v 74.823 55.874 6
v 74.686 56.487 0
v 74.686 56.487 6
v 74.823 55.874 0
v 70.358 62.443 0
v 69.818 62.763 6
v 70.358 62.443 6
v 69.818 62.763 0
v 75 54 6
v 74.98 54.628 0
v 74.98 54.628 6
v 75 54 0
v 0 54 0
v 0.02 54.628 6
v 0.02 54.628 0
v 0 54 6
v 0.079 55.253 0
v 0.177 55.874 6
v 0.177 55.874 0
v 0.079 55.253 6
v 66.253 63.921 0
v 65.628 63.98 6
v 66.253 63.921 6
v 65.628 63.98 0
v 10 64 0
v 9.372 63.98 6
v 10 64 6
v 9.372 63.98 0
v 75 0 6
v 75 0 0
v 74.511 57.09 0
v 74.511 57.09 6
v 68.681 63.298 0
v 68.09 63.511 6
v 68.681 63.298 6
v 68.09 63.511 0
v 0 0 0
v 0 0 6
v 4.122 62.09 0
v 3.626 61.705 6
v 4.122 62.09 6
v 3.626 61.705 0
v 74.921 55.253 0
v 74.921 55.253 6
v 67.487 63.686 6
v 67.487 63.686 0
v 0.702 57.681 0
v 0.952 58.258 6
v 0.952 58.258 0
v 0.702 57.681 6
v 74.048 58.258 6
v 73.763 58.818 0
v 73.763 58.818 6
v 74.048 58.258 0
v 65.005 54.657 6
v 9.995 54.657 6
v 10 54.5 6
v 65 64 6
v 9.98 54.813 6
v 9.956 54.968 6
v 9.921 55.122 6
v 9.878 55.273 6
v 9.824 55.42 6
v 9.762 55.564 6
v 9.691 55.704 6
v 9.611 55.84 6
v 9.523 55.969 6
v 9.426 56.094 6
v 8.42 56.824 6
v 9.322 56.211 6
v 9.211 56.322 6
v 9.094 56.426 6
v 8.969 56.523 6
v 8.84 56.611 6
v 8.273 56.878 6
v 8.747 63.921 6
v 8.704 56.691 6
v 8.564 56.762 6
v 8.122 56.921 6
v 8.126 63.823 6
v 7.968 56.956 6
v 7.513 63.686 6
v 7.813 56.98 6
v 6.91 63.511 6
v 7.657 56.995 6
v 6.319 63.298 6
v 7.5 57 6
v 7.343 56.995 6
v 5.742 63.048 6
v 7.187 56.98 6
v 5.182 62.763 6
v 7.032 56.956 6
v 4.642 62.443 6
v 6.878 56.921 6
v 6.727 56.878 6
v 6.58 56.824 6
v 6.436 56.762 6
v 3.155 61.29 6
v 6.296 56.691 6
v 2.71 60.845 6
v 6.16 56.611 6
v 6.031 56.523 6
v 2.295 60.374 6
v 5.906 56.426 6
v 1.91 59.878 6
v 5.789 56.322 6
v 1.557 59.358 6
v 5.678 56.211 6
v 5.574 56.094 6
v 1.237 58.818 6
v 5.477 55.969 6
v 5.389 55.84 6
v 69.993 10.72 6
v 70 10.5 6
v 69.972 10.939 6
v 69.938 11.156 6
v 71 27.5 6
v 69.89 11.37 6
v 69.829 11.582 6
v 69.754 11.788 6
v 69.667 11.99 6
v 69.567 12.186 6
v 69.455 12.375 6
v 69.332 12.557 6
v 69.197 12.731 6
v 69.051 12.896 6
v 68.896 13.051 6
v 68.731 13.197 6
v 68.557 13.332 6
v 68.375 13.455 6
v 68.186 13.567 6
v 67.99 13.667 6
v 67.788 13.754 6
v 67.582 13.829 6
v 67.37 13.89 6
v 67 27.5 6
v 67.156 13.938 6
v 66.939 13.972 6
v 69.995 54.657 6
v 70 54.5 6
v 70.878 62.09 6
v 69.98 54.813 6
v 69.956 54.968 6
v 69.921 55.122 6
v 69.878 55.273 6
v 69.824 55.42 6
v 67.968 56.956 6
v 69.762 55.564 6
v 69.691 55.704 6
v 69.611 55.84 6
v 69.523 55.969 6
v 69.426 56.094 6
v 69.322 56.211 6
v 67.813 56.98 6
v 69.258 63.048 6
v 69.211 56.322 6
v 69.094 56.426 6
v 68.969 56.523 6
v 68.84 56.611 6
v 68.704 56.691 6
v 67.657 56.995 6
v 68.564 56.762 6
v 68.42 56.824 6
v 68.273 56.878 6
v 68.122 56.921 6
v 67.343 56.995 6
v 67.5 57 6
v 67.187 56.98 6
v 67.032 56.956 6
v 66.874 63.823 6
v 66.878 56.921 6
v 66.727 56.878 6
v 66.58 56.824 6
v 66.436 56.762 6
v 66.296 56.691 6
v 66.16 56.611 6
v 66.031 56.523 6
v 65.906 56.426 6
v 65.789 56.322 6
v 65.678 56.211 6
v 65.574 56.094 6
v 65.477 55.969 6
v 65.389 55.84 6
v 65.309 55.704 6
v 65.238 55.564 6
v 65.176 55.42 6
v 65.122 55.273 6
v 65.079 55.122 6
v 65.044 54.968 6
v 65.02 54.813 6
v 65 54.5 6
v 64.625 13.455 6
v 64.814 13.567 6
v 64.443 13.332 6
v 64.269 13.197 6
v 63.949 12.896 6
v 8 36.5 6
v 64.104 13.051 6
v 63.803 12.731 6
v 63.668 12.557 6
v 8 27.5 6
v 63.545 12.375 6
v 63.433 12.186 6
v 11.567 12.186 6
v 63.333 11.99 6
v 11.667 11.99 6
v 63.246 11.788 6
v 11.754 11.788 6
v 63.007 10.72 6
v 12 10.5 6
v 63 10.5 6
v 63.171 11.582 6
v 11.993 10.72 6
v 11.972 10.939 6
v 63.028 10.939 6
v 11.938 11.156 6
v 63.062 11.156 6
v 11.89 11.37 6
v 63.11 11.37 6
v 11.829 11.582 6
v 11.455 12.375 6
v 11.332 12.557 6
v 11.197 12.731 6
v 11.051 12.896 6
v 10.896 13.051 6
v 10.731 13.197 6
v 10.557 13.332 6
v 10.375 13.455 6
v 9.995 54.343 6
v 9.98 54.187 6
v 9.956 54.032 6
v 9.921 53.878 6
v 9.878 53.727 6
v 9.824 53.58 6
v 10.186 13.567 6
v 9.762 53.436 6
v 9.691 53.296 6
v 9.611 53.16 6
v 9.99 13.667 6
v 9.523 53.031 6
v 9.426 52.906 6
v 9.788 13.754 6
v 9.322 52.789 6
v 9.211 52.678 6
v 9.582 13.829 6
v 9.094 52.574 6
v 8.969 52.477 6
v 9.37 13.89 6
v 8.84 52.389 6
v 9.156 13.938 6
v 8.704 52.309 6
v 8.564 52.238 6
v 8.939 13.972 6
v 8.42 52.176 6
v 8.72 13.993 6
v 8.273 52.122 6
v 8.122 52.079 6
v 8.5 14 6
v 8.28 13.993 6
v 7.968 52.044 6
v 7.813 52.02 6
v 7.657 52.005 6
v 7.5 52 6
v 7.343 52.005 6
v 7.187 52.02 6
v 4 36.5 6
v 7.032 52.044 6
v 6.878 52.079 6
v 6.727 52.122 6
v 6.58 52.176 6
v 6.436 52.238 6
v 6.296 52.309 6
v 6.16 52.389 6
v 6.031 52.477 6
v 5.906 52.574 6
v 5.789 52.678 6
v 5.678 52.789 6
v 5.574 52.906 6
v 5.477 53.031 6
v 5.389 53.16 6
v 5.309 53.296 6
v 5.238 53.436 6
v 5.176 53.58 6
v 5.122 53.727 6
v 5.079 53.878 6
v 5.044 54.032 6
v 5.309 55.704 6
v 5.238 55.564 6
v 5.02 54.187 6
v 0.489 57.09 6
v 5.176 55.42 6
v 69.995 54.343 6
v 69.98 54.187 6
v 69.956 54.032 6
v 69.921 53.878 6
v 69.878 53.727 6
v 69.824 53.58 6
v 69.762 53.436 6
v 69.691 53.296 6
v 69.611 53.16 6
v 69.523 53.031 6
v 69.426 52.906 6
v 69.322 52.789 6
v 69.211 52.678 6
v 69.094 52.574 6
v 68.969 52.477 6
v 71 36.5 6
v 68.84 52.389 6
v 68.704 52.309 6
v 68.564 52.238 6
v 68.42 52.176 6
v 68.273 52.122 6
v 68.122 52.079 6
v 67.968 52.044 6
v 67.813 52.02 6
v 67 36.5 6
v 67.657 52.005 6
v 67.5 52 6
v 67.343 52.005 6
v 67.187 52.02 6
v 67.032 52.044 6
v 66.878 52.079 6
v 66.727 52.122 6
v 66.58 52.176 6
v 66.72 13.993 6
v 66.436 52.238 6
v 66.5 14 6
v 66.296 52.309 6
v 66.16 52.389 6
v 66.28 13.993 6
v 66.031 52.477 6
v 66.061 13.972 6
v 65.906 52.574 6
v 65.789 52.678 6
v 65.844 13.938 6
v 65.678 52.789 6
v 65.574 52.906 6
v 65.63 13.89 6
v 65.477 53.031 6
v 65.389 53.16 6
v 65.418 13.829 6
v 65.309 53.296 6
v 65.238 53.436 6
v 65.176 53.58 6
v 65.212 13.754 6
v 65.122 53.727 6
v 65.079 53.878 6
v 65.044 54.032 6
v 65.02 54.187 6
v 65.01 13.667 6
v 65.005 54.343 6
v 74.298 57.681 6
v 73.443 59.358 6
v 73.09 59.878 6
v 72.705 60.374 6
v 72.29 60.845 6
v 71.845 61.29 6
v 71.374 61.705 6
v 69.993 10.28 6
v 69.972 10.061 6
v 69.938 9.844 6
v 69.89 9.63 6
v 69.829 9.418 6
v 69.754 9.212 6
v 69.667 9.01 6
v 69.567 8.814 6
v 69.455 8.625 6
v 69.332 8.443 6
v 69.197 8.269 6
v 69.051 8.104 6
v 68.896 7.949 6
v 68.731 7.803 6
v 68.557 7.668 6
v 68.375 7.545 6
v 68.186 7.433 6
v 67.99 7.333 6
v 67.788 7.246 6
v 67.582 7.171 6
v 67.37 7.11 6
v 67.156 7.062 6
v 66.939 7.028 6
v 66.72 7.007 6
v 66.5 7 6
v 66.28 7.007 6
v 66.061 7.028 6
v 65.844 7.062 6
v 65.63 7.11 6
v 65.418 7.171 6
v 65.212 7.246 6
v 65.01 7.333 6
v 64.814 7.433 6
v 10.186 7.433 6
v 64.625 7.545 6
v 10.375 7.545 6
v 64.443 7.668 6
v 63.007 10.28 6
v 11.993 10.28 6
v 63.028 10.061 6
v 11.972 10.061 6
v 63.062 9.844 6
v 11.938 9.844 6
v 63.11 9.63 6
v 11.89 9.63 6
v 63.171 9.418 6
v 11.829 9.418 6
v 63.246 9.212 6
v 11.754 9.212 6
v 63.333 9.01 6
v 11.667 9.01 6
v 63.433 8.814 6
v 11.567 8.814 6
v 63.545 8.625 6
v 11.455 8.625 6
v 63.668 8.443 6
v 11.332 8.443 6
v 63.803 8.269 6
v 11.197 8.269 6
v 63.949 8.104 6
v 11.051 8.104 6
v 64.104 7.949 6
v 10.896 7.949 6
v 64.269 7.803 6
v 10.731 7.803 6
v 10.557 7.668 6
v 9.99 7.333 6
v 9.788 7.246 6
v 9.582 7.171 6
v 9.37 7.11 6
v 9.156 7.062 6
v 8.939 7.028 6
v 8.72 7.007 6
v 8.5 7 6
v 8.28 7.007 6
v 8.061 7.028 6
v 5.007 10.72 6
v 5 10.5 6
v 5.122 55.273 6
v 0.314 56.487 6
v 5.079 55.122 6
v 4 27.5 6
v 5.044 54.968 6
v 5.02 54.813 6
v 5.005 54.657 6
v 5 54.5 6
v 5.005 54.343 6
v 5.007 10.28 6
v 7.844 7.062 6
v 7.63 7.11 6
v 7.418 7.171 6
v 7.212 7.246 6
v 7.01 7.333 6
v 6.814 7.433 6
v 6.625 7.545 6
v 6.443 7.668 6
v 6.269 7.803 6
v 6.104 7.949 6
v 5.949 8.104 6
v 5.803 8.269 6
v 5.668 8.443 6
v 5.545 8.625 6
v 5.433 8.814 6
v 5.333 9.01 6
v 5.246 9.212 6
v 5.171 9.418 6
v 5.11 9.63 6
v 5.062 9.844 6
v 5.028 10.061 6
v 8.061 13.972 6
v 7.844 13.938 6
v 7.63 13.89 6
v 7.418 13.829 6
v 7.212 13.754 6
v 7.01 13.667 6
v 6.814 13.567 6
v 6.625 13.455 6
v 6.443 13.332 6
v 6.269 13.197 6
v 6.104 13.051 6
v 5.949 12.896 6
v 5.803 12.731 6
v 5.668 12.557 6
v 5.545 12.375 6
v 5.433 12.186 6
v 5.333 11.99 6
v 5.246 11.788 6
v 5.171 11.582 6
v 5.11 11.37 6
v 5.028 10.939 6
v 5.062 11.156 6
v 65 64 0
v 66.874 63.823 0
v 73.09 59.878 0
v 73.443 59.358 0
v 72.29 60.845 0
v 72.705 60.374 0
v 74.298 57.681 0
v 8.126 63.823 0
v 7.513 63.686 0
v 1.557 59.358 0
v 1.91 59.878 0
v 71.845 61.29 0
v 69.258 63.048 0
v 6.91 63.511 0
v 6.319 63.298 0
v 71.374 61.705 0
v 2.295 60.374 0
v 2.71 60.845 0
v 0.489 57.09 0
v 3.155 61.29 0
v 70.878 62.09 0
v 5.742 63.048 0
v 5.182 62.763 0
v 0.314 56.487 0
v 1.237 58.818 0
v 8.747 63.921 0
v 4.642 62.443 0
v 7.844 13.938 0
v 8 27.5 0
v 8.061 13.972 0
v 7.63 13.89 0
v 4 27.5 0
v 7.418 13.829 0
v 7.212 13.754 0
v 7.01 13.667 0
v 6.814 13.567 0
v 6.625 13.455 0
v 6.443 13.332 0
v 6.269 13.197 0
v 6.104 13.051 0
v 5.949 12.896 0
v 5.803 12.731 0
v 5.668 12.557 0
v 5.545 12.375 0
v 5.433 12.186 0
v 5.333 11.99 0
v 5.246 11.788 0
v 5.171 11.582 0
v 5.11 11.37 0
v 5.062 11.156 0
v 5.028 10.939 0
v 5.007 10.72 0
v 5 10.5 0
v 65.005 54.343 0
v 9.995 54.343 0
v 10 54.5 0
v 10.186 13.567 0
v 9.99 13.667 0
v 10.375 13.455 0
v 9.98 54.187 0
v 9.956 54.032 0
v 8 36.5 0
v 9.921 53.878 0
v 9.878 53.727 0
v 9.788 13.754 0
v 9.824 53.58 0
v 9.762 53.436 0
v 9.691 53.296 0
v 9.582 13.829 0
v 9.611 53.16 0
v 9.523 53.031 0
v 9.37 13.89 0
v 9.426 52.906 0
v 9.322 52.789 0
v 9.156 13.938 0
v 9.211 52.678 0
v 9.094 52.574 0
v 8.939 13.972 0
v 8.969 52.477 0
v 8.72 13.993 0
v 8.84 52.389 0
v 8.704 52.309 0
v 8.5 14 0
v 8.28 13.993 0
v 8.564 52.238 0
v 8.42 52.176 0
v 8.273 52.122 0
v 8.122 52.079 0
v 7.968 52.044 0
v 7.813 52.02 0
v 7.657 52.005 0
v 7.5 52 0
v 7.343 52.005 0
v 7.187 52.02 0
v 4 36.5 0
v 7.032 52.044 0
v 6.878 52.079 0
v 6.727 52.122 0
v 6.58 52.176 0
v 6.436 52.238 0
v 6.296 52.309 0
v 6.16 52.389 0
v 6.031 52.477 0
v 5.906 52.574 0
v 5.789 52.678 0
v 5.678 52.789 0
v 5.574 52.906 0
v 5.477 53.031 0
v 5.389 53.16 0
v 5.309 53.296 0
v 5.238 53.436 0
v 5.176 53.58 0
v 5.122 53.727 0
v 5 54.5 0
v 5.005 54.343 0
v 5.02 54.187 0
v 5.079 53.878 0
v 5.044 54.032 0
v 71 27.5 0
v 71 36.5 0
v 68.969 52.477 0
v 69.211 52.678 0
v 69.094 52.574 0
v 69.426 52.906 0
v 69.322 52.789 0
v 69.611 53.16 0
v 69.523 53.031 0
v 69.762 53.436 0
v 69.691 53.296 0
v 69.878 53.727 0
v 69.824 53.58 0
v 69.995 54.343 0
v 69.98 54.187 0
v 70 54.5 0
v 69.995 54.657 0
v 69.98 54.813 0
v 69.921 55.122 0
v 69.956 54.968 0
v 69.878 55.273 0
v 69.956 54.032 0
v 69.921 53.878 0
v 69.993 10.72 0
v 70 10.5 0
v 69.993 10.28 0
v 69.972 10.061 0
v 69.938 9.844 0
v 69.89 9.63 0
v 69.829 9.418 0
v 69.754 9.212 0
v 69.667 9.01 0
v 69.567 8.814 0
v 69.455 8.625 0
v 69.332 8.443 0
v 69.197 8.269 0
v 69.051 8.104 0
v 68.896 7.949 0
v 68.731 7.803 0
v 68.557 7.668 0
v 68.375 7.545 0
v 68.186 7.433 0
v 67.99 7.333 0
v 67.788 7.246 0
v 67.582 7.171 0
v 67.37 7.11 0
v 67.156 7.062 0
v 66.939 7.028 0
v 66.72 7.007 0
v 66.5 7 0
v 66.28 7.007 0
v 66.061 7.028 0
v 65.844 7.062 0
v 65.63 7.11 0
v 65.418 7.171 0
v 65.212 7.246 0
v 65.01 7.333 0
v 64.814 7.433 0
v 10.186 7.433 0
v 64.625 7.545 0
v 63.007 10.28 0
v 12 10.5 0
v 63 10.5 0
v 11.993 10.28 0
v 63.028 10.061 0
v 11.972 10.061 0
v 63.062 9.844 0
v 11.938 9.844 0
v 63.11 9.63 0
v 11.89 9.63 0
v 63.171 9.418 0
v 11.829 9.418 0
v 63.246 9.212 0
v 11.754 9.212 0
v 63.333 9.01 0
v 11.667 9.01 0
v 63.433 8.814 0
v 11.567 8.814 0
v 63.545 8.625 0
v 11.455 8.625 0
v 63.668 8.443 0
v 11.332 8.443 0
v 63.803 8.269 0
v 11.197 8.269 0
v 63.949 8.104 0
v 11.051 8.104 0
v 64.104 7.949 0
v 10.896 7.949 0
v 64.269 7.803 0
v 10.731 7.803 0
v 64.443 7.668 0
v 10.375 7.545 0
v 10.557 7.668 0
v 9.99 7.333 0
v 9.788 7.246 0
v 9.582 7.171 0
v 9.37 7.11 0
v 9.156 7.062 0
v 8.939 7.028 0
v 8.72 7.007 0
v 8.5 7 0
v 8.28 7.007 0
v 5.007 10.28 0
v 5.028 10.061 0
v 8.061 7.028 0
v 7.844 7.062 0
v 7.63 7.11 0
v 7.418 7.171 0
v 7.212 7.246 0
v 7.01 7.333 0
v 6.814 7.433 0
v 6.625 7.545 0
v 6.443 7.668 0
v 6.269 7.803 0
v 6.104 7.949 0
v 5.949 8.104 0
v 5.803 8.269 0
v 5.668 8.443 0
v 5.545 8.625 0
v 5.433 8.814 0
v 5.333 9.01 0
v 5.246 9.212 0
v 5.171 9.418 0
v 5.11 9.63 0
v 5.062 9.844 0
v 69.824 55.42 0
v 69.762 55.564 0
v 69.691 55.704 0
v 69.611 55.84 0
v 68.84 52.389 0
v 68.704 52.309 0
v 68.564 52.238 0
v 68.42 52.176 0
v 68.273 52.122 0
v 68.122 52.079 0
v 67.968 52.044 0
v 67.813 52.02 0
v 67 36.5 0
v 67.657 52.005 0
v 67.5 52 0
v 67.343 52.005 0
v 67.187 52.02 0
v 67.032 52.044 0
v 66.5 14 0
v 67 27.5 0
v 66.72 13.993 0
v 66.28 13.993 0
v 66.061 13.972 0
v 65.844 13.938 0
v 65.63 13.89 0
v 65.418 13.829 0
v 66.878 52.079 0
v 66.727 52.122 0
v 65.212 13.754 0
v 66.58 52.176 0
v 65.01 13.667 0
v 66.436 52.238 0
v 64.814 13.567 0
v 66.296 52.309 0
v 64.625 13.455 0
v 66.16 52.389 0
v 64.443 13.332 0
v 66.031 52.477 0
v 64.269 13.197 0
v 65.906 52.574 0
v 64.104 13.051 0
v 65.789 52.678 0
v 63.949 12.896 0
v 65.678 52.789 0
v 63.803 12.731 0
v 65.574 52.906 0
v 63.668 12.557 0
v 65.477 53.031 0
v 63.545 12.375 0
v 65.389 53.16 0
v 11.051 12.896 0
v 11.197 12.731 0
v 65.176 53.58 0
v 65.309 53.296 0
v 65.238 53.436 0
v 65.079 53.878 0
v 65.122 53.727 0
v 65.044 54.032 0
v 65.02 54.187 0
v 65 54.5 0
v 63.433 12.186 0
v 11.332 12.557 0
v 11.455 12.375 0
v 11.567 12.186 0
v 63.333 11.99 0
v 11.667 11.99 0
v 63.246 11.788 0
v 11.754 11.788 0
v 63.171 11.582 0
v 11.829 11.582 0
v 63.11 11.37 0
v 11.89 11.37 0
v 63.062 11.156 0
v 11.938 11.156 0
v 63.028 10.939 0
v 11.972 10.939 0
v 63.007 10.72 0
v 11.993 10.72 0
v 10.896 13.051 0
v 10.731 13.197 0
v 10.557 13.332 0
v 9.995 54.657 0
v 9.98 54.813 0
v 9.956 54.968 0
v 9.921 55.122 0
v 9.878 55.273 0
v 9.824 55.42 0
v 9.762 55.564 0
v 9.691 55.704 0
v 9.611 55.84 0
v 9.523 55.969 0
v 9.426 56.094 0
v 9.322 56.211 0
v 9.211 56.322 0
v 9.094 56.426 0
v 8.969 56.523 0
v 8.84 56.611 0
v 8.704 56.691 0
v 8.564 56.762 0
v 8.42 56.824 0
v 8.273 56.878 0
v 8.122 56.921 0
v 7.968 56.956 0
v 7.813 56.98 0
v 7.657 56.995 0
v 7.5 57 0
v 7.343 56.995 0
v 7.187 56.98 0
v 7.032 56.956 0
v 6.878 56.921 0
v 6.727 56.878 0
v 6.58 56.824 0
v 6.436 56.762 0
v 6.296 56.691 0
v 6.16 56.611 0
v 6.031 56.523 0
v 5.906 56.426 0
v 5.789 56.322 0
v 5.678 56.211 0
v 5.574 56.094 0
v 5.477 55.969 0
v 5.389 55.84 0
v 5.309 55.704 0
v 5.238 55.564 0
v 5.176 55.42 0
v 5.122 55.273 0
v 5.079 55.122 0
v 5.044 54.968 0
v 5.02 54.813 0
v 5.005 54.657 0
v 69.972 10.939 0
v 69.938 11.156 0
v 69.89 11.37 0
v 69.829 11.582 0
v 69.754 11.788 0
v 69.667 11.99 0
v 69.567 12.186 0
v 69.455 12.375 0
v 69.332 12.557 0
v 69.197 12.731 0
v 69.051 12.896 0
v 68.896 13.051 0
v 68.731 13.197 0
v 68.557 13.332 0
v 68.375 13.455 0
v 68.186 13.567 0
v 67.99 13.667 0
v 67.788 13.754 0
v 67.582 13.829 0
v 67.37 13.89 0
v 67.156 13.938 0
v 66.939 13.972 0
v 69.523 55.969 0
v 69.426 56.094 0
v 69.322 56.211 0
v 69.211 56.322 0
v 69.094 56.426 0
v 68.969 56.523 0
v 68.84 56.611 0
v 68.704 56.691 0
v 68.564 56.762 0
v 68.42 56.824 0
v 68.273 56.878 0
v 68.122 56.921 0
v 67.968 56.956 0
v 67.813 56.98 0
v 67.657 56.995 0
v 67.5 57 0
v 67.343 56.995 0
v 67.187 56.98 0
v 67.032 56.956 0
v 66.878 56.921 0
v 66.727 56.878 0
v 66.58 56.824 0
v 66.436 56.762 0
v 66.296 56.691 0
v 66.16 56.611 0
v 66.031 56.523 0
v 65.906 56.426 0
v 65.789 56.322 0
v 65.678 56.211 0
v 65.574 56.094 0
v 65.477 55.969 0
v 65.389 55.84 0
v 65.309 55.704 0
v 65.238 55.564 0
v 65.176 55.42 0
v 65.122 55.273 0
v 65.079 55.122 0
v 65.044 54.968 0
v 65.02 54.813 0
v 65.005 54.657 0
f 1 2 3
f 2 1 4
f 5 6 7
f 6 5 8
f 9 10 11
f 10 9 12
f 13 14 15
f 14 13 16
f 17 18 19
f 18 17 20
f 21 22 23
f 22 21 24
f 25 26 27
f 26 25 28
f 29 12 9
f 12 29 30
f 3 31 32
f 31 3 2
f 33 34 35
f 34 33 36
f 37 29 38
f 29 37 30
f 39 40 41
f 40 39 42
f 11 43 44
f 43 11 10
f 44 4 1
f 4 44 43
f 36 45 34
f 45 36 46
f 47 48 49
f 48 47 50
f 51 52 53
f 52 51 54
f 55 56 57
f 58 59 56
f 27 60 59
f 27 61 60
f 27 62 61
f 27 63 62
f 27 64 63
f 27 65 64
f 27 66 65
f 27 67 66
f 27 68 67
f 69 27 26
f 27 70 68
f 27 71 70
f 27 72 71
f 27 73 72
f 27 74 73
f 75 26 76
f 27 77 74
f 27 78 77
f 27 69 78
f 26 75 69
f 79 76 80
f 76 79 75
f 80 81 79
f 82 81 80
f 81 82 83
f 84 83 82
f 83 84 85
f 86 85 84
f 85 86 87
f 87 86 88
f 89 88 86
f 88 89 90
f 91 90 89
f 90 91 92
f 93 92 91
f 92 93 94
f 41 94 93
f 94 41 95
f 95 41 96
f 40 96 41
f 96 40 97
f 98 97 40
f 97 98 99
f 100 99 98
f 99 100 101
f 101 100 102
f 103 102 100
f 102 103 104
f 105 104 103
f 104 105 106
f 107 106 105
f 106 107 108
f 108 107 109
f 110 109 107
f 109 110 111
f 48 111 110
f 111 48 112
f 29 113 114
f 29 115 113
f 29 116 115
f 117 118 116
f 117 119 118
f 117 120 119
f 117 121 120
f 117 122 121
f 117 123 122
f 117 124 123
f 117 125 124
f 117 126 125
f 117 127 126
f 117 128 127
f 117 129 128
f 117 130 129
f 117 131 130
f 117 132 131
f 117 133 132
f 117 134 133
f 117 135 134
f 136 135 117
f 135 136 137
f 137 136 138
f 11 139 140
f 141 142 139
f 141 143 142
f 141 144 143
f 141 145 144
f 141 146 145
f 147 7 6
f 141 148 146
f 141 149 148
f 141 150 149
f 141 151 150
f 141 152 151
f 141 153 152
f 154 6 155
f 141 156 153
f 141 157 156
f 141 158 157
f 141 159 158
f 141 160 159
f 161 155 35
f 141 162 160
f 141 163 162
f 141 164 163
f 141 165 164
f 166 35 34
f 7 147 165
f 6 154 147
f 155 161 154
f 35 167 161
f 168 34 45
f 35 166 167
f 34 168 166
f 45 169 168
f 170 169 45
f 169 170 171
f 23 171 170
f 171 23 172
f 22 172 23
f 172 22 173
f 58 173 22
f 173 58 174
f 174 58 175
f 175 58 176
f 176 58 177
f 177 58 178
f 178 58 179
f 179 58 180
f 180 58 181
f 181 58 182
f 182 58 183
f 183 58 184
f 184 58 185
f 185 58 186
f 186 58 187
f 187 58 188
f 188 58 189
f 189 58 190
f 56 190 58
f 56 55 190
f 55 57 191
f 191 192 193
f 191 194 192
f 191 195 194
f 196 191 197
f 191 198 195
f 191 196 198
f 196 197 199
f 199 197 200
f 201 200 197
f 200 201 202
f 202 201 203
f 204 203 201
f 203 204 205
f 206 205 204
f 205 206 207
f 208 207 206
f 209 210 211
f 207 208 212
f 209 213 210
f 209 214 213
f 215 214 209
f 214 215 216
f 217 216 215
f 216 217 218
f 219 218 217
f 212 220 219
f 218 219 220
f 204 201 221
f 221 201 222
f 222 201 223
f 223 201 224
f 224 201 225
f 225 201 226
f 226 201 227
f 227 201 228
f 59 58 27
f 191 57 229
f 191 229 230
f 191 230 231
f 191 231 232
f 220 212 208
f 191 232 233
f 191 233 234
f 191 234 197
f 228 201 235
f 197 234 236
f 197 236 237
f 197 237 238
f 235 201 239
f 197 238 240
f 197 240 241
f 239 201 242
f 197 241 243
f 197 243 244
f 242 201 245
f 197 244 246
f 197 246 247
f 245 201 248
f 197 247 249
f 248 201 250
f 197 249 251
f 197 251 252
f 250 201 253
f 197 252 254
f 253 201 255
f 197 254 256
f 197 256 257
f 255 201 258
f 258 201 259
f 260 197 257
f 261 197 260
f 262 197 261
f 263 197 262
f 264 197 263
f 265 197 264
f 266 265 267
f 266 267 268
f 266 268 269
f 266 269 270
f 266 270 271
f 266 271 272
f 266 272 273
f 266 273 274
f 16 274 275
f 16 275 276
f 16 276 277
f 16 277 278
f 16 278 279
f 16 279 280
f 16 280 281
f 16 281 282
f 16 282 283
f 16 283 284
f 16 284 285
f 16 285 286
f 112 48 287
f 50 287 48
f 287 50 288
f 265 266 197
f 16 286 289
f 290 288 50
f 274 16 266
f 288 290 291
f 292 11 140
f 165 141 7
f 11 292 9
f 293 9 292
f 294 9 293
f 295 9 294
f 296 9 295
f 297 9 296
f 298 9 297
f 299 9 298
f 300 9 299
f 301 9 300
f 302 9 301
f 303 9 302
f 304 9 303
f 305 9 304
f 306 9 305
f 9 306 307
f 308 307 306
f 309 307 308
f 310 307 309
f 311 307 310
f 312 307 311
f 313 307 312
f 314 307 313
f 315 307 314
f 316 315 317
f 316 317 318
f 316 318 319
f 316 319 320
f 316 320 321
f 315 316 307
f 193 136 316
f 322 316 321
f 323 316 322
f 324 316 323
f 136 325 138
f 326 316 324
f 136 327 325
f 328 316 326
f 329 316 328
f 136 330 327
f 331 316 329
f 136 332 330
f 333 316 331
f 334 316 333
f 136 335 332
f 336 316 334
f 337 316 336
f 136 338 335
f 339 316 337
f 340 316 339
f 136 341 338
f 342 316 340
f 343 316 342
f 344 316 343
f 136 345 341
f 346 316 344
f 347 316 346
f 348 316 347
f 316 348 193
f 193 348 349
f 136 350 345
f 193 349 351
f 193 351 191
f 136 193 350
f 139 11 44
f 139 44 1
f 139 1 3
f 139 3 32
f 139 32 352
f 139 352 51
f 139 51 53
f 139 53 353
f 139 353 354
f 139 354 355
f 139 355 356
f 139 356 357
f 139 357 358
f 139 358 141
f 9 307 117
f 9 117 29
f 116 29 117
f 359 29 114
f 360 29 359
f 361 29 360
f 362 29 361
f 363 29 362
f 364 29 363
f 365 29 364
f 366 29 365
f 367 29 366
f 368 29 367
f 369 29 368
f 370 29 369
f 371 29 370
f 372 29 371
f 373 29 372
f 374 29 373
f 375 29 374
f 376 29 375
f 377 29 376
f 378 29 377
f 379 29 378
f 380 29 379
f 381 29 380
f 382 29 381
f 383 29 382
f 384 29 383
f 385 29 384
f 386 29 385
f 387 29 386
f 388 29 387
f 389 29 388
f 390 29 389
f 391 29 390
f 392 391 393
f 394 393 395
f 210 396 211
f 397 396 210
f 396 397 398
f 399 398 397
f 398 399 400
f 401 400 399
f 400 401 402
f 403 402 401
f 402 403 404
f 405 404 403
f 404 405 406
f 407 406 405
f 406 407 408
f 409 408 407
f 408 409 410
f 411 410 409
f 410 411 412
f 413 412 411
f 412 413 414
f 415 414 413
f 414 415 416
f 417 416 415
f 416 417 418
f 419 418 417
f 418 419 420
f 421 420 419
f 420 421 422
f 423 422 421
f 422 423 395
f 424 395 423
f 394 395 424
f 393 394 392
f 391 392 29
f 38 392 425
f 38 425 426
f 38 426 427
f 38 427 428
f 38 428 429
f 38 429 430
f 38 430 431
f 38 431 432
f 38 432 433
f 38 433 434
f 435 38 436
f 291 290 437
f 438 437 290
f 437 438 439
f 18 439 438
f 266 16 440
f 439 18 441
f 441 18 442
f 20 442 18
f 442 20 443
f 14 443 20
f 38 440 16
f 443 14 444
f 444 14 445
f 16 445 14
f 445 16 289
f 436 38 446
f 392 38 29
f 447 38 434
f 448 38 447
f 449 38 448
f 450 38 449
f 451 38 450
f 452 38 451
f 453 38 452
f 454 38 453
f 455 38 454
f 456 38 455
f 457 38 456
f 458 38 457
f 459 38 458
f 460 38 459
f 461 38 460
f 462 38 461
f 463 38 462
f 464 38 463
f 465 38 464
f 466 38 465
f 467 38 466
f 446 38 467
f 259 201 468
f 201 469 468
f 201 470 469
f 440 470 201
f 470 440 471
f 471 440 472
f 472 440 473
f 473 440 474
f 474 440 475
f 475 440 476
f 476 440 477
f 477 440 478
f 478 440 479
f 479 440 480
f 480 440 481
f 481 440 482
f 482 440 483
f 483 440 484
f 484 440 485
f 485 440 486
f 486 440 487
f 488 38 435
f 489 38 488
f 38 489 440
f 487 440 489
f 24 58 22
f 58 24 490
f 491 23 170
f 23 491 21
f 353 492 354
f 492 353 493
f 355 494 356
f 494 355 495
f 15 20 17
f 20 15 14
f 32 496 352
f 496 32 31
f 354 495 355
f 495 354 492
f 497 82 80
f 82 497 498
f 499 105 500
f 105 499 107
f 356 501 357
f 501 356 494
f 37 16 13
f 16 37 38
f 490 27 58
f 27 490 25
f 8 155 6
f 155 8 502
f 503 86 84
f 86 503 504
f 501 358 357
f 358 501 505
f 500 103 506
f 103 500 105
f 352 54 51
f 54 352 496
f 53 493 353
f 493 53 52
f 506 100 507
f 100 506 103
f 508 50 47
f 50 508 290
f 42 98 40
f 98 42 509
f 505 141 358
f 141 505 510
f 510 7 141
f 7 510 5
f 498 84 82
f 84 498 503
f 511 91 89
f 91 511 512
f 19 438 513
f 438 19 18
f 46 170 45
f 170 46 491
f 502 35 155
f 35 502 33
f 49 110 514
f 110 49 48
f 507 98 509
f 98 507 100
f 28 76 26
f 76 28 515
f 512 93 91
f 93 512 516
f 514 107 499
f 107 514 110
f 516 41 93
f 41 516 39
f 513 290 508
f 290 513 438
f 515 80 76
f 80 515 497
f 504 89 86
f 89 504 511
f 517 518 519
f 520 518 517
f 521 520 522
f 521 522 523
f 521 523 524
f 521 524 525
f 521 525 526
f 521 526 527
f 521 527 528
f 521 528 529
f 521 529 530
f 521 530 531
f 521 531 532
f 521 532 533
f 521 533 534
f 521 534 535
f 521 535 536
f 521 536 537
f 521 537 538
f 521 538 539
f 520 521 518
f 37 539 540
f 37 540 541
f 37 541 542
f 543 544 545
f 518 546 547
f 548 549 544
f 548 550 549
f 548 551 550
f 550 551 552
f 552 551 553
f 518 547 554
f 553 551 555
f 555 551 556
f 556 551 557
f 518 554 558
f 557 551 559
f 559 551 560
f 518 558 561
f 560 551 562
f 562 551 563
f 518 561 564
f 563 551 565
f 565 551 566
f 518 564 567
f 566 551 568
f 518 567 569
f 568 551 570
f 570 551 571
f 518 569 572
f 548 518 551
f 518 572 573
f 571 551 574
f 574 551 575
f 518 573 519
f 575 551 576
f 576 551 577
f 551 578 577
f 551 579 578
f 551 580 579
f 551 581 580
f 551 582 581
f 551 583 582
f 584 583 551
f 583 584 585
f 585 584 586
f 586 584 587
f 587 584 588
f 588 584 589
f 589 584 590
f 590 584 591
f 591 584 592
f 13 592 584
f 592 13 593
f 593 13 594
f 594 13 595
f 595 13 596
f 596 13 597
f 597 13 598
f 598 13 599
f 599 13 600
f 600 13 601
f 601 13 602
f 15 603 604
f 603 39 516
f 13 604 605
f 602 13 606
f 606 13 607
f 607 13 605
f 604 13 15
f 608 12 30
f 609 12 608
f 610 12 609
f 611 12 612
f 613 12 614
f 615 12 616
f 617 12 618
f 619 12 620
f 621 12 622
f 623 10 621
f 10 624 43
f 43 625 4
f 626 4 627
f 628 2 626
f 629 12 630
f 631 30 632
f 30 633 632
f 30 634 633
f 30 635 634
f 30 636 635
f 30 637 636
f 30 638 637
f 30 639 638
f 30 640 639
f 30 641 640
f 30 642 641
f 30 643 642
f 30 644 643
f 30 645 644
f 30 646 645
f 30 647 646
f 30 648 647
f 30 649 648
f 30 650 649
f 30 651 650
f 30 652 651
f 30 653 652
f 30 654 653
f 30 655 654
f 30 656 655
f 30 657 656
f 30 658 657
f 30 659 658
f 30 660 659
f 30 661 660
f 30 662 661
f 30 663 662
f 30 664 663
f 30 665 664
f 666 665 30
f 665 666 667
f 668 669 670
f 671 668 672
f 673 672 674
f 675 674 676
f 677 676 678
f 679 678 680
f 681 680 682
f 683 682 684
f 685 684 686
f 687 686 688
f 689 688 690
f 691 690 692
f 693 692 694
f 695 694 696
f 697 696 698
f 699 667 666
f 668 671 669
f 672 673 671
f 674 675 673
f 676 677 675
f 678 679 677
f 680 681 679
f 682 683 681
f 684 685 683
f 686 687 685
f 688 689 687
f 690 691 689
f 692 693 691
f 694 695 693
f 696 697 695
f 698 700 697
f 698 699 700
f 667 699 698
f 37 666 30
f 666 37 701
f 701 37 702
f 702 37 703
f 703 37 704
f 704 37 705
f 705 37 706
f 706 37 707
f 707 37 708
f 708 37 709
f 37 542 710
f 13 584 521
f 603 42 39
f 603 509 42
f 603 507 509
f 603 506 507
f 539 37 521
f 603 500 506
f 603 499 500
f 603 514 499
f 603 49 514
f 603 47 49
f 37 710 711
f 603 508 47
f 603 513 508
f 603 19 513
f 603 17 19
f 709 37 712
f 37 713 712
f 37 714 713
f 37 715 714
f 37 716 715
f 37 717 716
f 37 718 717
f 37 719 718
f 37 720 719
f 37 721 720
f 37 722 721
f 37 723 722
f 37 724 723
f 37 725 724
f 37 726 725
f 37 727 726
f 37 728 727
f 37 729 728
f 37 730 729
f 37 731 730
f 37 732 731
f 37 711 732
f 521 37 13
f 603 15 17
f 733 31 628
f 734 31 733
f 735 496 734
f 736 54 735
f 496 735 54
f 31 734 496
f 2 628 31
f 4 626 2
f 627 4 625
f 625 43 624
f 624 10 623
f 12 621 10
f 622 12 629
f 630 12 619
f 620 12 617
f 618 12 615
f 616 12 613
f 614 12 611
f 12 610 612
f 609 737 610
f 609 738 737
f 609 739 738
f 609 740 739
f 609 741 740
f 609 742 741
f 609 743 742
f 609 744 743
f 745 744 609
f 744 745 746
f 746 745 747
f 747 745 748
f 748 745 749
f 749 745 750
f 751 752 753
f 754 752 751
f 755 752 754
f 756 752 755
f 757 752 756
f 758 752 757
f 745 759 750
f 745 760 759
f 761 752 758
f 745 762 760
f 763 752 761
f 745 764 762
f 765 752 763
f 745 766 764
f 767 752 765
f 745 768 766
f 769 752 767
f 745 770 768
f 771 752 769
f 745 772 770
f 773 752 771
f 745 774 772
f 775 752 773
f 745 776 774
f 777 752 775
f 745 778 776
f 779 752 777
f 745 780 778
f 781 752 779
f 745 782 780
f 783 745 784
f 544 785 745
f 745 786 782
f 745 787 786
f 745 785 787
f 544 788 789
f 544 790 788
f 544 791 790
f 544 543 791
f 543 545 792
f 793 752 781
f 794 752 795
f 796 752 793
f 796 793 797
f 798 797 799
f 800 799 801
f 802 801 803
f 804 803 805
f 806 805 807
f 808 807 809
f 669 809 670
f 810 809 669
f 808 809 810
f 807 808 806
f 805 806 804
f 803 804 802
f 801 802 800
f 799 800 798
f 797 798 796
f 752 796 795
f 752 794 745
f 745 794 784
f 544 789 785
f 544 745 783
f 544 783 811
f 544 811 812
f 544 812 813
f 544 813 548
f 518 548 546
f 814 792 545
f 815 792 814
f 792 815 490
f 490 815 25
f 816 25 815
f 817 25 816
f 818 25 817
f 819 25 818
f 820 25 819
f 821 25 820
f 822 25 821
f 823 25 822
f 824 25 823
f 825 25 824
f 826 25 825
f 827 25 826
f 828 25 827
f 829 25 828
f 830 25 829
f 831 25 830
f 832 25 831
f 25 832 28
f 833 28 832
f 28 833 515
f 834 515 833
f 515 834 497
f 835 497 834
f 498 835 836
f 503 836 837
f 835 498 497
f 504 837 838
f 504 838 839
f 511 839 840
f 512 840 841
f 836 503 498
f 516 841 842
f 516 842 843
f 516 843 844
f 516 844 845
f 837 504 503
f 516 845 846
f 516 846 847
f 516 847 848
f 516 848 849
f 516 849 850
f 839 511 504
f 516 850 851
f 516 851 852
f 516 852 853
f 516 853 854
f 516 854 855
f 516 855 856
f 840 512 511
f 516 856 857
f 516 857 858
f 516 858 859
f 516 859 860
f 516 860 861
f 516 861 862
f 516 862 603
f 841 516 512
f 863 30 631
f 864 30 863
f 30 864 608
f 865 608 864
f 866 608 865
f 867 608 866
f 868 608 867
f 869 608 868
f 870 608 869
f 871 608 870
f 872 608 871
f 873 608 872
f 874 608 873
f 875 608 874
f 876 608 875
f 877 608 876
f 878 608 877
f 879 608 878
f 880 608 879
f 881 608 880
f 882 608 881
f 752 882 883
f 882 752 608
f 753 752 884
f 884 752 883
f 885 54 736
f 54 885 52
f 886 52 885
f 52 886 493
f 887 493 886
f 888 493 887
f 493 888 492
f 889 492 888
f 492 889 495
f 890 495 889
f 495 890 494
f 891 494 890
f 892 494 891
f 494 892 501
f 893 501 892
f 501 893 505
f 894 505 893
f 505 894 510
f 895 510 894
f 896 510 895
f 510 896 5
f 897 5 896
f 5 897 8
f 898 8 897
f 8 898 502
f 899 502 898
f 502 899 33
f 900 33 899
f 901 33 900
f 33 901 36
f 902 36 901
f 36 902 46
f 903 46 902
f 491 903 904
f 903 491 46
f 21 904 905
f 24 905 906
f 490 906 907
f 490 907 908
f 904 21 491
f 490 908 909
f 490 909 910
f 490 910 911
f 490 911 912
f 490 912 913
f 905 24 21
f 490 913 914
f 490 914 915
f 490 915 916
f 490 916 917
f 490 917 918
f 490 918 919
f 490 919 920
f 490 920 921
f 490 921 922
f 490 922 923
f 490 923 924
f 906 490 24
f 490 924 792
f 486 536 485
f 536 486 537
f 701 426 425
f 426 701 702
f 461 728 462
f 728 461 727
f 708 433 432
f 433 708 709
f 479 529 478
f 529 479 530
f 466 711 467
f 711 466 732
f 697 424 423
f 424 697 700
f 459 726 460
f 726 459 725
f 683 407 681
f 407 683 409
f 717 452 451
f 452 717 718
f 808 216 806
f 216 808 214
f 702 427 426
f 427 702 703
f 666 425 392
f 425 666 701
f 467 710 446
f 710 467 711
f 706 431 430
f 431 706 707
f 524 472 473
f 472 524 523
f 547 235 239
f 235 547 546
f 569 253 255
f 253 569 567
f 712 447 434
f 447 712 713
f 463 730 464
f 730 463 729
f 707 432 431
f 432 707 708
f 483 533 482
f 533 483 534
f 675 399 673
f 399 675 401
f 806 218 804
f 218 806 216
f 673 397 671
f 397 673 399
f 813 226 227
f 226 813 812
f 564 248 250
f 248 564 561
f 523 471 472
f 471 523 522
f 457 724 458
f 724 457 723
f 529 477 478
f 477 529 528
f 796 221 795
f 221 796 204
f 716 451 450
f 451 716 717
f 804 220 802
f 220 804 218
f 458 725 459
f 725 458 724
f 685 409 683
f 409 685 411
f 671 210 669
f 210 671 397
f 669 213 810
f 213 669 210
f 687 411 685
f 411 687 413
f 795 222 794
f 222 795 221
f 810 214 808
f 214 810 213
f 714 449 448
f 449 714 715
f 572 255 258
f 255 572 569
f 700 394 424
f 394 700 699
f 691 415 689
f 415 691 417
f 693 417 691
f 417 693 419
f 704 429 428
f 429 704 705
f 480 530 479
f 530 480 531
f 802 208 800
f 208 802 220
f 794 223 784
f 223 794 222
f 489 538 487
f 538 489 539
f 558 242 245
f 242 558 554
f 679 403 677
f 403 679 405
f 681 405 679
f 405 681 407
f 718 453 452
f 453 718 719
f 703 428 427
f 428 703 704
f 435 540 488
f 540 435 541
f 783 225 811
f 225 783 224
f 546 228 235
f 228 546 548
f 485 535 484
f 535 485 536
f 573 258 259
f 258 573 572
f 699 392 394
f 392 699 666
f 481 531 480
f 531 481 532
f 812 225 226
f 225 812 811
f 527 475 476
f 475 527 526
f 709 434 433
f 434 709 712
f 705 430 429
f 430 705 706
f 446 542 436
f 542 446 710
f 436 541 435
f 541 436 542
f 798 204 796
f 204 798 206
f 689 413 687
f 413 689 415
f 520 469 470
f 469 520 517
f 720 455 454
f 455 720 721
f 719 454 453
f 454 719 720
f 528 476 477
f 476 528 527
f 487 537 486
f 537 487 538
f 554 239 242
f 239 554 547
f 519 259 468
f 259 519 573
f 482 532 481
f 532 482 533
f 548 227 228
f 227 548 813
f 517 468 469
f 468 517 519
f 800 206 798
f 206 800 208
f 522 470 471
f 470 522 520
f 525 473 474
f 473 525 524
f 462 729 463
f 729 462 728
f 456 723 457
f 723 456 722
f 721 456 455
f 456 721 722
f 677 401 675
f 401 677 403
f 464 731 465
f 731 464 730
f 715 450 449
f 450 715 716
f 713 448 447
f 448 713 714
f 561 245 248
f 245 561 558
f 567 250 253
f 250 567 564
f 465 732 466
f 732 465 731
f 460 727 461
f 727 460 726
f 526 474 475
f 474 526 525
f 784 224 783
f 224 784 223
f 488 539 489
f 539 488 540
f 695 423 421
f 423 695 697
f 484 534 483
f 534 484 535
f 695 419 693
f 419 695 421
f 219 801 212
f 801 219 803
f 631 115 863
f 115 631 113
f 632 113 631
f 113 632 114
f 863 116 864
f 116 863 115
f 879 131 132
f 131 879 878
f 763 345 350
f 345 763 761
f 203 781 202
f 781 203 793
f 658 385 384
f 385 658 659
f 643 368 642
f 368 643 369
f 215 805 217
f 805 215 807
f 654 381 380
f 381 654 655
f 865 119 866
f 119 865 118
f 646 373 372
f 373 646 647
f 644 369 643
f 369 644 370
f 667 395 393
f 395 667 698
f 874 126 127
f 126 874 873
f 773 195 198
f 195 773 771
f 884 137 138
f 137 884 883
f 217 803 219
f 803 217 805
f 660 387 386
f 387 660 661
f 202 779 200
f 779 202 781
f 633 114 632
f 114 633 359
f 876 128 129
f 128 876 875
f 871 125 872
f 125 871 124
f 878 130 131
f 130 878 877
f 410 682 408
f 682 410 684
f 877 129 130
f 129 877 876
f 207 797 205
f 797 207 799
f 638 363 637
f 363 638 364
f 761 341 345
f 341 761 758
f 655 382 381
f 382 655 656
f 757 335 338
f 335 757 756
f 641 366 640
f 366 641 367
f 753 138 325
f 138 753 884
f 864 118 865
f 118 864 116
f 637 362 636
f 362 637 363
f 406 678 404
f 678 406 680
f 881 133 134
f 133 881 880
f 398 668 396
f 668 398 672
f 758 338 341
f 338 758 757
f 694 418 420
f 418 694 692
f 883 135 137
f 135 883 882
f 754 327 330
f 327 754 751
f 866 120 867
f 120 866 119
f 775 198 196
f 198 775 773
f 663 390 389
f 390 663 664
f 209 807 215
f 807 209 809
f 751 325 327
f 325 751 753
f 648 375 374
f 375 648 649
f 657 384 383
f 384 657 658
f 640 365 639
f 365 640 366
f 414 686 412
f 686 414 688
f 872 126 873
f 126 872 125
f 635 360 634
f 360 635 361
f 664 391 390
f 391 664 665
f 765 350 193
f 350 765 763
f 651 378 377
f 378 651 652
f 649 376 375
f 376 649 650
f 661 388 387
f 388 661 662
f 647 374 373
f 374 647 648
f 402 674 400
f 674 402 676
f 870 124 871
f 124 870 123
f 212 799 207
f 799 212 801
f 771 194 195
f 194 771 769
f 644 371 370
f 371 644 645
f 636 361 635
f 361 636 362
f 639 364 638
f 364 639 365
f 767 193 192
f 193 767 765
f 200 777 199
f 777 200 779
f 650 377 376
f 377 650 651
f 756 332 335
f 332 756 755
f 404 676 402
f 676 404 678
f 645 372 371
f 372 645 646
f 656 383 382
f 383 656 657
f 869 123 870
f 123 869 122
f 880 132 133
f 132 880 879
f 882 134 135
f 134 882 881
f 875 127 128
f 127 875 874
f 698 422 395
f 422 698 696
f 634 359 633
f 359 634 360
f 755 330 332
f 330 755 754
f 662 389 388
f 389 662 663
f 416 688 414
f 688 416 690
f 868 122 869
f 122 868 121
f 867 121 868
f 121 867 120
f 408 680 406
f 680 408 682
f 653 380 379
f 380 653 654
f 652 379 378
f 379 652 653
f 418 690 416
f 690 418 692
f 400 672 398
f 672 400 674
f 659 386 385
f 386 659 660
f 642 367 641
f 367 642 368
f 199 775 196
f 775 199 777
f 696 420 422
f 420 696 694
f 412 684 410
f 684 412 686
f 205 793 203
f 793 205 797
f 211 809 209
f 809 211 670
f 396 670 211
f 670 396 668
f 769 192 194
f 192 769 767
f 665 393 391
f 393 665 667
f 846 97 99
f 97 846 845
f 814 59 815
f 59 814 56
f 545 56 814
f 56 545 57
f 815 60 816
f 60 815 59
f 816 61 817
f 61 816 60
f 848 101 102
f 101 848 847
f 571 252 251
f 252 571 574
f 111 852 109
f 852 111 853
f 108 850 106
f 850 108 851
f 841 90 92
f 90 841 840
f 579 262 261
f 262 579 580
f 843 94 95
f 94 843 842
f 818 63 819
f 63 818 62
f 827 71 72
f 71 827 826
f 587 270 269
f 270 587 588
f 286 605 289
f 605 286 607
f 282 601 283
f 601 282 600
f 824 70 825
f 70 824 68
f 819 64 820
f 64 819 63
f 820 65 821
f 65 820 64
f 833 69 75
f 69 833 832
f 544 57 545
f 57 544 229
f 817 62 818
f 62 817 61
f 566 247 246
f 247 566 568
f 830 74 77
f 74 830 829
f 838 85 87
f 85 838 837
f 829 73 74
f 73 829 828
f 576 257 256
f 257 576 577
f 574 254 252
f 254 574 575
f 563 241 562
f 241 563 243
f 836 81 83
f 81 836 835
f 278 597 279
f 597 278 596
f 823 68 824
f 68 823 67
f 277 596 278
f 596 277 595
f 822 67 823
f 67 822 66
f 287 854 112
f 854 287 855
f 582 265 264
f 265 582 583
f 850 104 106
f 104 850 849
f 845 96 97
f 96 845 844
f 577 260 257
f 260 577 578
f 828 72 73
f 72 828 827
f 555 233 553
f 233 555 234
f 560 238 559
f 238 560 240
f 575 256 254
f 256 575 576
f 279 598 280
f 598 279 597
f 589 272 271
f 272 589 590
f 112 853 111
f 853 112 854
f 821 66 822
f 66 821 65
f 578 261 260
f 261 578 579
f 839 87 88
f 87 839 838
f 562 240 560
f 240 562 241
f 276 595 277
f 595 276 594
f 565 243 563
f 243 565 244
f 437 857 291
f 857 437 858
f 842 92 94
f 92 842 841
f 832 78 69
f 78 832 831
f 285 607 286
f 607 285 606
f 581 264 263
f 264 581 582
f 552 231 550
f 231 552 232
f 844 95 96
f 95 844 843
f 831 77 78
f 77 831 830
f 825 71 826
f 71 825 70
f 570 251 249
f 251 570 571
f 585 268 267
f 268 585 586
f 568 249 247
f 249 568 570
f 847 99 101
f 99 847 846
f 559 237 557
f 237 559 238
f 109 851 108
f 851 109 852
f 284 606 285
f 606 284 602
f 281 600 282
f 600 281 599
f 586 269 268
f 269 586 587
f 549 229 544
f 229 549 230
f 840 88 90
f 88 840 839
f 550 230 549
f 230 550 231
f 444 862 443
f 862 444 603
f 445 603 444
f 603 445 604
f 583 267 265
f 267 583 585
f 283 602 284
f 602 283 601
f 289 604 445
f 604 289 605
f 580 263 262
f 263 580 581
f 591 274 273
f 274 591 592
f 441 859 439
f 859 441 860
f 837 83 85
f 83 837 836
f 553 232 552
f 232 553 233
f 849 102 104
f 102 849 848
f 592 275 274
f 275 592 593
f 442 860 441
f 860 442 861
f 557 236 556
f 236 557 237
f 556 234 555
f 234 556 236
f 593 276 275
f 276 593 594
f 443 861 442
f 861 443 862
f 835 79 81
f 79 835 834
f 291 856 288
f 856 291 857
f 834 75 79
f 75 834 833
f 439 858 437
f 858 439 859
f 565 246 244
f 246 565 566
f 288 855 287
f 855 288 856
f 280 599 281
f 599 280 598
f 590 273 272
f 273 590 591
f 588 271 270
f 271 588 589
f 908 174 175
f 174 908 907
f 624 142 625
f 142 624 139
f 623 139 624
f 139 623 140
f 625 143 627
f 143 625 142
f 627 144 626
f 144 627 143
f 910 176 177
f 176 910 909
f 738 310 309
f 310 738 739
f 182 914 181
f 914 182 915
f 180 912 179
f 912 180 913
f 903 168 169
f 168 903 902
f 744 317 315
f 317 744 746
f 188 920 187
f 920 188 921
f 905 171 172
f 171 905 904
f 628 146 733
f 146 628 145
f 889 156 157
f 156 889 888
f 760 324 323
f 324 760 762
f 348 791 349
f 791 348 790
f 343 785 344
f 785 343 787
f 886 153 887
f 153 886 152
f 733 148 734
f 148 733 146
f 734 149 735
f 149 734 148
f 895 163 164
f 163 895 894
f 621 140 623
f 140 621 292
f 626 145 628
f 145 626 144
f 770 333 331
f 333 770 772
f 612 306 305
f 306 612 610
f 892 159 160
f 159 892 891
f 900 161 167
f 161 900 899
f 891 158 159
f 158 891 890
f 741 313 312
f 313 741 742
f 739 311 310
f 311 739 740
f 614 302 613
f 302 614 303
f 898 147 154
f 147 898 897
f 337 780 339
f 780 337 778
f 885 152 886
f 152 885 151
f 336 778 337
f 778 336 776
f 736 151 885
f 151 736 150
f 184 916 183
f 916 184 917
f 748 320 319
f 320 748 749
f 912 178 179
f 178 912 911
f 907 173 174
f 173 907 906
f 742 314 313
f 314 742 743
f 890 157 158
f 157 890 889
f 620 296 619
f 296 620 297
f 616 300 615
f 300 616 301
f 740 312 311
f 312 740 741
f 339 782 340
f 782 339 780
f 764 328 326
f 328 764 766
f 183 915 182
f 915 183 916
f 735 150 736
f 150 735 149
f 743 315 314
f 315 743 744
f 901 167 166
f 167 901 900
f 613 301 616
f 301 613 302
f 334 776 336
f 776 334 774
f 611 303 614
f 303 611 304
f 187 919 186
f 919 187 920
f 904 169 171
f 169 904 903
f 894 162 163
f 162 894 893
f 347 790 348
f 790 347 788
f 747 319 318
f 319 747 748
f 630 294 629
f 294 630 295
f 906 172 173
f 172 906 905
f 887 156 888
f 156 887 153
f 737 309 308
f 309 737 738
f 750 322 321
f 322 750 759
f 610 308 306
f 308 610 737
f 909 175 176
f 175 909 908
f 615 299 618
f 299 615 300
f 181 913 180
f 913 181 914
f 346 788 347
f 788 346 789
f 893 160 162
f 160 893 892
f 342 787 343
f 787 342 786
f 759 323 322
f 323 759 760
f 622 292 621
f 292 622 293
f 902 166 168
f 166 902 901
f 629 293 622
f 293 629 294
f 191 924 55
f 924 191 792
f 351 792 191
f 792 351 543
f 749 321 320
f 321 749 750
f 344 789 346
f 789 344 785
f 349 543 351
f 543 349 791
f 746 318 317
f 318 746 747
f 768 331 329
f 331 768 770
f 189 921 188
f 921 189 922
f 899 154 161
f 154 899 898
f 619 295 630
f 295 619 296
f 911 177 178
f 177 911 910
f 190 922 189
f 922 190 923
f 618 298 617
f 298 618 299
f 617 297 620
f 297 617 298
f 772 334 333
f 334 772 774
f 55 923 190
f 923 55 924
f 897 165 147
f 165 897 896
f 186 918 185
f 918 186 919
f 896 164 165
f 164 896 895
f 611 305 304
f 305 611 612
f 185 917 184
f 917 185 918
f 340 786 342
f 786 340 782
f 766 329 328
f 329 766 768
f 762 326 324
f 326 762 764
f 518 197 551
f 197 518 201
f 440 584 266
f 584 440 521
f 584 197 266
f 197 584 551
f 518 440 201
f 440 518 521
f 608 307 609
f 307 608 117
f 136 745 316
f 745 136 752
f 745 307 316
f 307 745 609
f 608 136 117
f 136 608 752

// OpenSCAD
thickness = 6;
width = 75;
depth = 64;
height = 50;

$fn = 100;

base();

color("green") {

}

module base() {
    difference() {
        union() {
            block_with_fillet(width, depth, thickness, 10);
            cube([width, 10, thickness]);
        }
        big_holes();
        small_holes();
        belt_holes();
    }
}

module big_holes() {
    diameter = 7;
    translate([diameter / 2 + 5, diameter / 2 + 7, - 0.1])
        cylinder(d = diameter, h = thickness * 1.1);

    translate([width - (5 + diameter / 2), diameter / 2 + 7, - 0.1])
        cylinder(d = diameter, h = thickness * 1.1);

}

module small_holes() {
    diameter = 5;

    translate([diameter / 2 + 5, depth - (diameter / 2 + 7), - 0.1])
        cylinder(d = diameter, h = thickness * 1.1);

    translate([width - (5 + diameter / 2), depth - (diameter / 2 + 7), - 0.1])
        cylinder(d = diameter, h = thickness * 1.1);
}

module belt_holes() {
    hole_width = 4;
    hole_depth = 9;
    offset_from_edge = 4;

    translate([offset_from_edge, (depth - 9) / 2, - 0.1])
        cube([hole_width, hole_depth, thickness + 0.2]);
    translate([width - (offset_from_edge + hole_width), (depth - 9) / 2, - 0.1])
        cube([hole_width, hole_depth, thickness + 0.2]);

}

module block_with_fillet(width, depth, height, fillet) {
    minkowski() {
        cube([width - (fillet * 2), depth - (fillet * 2), height / 2]);
        translate([fillet, fillet, 0])
            cylinder(r = fillet, h = height / 2);
    }
}
